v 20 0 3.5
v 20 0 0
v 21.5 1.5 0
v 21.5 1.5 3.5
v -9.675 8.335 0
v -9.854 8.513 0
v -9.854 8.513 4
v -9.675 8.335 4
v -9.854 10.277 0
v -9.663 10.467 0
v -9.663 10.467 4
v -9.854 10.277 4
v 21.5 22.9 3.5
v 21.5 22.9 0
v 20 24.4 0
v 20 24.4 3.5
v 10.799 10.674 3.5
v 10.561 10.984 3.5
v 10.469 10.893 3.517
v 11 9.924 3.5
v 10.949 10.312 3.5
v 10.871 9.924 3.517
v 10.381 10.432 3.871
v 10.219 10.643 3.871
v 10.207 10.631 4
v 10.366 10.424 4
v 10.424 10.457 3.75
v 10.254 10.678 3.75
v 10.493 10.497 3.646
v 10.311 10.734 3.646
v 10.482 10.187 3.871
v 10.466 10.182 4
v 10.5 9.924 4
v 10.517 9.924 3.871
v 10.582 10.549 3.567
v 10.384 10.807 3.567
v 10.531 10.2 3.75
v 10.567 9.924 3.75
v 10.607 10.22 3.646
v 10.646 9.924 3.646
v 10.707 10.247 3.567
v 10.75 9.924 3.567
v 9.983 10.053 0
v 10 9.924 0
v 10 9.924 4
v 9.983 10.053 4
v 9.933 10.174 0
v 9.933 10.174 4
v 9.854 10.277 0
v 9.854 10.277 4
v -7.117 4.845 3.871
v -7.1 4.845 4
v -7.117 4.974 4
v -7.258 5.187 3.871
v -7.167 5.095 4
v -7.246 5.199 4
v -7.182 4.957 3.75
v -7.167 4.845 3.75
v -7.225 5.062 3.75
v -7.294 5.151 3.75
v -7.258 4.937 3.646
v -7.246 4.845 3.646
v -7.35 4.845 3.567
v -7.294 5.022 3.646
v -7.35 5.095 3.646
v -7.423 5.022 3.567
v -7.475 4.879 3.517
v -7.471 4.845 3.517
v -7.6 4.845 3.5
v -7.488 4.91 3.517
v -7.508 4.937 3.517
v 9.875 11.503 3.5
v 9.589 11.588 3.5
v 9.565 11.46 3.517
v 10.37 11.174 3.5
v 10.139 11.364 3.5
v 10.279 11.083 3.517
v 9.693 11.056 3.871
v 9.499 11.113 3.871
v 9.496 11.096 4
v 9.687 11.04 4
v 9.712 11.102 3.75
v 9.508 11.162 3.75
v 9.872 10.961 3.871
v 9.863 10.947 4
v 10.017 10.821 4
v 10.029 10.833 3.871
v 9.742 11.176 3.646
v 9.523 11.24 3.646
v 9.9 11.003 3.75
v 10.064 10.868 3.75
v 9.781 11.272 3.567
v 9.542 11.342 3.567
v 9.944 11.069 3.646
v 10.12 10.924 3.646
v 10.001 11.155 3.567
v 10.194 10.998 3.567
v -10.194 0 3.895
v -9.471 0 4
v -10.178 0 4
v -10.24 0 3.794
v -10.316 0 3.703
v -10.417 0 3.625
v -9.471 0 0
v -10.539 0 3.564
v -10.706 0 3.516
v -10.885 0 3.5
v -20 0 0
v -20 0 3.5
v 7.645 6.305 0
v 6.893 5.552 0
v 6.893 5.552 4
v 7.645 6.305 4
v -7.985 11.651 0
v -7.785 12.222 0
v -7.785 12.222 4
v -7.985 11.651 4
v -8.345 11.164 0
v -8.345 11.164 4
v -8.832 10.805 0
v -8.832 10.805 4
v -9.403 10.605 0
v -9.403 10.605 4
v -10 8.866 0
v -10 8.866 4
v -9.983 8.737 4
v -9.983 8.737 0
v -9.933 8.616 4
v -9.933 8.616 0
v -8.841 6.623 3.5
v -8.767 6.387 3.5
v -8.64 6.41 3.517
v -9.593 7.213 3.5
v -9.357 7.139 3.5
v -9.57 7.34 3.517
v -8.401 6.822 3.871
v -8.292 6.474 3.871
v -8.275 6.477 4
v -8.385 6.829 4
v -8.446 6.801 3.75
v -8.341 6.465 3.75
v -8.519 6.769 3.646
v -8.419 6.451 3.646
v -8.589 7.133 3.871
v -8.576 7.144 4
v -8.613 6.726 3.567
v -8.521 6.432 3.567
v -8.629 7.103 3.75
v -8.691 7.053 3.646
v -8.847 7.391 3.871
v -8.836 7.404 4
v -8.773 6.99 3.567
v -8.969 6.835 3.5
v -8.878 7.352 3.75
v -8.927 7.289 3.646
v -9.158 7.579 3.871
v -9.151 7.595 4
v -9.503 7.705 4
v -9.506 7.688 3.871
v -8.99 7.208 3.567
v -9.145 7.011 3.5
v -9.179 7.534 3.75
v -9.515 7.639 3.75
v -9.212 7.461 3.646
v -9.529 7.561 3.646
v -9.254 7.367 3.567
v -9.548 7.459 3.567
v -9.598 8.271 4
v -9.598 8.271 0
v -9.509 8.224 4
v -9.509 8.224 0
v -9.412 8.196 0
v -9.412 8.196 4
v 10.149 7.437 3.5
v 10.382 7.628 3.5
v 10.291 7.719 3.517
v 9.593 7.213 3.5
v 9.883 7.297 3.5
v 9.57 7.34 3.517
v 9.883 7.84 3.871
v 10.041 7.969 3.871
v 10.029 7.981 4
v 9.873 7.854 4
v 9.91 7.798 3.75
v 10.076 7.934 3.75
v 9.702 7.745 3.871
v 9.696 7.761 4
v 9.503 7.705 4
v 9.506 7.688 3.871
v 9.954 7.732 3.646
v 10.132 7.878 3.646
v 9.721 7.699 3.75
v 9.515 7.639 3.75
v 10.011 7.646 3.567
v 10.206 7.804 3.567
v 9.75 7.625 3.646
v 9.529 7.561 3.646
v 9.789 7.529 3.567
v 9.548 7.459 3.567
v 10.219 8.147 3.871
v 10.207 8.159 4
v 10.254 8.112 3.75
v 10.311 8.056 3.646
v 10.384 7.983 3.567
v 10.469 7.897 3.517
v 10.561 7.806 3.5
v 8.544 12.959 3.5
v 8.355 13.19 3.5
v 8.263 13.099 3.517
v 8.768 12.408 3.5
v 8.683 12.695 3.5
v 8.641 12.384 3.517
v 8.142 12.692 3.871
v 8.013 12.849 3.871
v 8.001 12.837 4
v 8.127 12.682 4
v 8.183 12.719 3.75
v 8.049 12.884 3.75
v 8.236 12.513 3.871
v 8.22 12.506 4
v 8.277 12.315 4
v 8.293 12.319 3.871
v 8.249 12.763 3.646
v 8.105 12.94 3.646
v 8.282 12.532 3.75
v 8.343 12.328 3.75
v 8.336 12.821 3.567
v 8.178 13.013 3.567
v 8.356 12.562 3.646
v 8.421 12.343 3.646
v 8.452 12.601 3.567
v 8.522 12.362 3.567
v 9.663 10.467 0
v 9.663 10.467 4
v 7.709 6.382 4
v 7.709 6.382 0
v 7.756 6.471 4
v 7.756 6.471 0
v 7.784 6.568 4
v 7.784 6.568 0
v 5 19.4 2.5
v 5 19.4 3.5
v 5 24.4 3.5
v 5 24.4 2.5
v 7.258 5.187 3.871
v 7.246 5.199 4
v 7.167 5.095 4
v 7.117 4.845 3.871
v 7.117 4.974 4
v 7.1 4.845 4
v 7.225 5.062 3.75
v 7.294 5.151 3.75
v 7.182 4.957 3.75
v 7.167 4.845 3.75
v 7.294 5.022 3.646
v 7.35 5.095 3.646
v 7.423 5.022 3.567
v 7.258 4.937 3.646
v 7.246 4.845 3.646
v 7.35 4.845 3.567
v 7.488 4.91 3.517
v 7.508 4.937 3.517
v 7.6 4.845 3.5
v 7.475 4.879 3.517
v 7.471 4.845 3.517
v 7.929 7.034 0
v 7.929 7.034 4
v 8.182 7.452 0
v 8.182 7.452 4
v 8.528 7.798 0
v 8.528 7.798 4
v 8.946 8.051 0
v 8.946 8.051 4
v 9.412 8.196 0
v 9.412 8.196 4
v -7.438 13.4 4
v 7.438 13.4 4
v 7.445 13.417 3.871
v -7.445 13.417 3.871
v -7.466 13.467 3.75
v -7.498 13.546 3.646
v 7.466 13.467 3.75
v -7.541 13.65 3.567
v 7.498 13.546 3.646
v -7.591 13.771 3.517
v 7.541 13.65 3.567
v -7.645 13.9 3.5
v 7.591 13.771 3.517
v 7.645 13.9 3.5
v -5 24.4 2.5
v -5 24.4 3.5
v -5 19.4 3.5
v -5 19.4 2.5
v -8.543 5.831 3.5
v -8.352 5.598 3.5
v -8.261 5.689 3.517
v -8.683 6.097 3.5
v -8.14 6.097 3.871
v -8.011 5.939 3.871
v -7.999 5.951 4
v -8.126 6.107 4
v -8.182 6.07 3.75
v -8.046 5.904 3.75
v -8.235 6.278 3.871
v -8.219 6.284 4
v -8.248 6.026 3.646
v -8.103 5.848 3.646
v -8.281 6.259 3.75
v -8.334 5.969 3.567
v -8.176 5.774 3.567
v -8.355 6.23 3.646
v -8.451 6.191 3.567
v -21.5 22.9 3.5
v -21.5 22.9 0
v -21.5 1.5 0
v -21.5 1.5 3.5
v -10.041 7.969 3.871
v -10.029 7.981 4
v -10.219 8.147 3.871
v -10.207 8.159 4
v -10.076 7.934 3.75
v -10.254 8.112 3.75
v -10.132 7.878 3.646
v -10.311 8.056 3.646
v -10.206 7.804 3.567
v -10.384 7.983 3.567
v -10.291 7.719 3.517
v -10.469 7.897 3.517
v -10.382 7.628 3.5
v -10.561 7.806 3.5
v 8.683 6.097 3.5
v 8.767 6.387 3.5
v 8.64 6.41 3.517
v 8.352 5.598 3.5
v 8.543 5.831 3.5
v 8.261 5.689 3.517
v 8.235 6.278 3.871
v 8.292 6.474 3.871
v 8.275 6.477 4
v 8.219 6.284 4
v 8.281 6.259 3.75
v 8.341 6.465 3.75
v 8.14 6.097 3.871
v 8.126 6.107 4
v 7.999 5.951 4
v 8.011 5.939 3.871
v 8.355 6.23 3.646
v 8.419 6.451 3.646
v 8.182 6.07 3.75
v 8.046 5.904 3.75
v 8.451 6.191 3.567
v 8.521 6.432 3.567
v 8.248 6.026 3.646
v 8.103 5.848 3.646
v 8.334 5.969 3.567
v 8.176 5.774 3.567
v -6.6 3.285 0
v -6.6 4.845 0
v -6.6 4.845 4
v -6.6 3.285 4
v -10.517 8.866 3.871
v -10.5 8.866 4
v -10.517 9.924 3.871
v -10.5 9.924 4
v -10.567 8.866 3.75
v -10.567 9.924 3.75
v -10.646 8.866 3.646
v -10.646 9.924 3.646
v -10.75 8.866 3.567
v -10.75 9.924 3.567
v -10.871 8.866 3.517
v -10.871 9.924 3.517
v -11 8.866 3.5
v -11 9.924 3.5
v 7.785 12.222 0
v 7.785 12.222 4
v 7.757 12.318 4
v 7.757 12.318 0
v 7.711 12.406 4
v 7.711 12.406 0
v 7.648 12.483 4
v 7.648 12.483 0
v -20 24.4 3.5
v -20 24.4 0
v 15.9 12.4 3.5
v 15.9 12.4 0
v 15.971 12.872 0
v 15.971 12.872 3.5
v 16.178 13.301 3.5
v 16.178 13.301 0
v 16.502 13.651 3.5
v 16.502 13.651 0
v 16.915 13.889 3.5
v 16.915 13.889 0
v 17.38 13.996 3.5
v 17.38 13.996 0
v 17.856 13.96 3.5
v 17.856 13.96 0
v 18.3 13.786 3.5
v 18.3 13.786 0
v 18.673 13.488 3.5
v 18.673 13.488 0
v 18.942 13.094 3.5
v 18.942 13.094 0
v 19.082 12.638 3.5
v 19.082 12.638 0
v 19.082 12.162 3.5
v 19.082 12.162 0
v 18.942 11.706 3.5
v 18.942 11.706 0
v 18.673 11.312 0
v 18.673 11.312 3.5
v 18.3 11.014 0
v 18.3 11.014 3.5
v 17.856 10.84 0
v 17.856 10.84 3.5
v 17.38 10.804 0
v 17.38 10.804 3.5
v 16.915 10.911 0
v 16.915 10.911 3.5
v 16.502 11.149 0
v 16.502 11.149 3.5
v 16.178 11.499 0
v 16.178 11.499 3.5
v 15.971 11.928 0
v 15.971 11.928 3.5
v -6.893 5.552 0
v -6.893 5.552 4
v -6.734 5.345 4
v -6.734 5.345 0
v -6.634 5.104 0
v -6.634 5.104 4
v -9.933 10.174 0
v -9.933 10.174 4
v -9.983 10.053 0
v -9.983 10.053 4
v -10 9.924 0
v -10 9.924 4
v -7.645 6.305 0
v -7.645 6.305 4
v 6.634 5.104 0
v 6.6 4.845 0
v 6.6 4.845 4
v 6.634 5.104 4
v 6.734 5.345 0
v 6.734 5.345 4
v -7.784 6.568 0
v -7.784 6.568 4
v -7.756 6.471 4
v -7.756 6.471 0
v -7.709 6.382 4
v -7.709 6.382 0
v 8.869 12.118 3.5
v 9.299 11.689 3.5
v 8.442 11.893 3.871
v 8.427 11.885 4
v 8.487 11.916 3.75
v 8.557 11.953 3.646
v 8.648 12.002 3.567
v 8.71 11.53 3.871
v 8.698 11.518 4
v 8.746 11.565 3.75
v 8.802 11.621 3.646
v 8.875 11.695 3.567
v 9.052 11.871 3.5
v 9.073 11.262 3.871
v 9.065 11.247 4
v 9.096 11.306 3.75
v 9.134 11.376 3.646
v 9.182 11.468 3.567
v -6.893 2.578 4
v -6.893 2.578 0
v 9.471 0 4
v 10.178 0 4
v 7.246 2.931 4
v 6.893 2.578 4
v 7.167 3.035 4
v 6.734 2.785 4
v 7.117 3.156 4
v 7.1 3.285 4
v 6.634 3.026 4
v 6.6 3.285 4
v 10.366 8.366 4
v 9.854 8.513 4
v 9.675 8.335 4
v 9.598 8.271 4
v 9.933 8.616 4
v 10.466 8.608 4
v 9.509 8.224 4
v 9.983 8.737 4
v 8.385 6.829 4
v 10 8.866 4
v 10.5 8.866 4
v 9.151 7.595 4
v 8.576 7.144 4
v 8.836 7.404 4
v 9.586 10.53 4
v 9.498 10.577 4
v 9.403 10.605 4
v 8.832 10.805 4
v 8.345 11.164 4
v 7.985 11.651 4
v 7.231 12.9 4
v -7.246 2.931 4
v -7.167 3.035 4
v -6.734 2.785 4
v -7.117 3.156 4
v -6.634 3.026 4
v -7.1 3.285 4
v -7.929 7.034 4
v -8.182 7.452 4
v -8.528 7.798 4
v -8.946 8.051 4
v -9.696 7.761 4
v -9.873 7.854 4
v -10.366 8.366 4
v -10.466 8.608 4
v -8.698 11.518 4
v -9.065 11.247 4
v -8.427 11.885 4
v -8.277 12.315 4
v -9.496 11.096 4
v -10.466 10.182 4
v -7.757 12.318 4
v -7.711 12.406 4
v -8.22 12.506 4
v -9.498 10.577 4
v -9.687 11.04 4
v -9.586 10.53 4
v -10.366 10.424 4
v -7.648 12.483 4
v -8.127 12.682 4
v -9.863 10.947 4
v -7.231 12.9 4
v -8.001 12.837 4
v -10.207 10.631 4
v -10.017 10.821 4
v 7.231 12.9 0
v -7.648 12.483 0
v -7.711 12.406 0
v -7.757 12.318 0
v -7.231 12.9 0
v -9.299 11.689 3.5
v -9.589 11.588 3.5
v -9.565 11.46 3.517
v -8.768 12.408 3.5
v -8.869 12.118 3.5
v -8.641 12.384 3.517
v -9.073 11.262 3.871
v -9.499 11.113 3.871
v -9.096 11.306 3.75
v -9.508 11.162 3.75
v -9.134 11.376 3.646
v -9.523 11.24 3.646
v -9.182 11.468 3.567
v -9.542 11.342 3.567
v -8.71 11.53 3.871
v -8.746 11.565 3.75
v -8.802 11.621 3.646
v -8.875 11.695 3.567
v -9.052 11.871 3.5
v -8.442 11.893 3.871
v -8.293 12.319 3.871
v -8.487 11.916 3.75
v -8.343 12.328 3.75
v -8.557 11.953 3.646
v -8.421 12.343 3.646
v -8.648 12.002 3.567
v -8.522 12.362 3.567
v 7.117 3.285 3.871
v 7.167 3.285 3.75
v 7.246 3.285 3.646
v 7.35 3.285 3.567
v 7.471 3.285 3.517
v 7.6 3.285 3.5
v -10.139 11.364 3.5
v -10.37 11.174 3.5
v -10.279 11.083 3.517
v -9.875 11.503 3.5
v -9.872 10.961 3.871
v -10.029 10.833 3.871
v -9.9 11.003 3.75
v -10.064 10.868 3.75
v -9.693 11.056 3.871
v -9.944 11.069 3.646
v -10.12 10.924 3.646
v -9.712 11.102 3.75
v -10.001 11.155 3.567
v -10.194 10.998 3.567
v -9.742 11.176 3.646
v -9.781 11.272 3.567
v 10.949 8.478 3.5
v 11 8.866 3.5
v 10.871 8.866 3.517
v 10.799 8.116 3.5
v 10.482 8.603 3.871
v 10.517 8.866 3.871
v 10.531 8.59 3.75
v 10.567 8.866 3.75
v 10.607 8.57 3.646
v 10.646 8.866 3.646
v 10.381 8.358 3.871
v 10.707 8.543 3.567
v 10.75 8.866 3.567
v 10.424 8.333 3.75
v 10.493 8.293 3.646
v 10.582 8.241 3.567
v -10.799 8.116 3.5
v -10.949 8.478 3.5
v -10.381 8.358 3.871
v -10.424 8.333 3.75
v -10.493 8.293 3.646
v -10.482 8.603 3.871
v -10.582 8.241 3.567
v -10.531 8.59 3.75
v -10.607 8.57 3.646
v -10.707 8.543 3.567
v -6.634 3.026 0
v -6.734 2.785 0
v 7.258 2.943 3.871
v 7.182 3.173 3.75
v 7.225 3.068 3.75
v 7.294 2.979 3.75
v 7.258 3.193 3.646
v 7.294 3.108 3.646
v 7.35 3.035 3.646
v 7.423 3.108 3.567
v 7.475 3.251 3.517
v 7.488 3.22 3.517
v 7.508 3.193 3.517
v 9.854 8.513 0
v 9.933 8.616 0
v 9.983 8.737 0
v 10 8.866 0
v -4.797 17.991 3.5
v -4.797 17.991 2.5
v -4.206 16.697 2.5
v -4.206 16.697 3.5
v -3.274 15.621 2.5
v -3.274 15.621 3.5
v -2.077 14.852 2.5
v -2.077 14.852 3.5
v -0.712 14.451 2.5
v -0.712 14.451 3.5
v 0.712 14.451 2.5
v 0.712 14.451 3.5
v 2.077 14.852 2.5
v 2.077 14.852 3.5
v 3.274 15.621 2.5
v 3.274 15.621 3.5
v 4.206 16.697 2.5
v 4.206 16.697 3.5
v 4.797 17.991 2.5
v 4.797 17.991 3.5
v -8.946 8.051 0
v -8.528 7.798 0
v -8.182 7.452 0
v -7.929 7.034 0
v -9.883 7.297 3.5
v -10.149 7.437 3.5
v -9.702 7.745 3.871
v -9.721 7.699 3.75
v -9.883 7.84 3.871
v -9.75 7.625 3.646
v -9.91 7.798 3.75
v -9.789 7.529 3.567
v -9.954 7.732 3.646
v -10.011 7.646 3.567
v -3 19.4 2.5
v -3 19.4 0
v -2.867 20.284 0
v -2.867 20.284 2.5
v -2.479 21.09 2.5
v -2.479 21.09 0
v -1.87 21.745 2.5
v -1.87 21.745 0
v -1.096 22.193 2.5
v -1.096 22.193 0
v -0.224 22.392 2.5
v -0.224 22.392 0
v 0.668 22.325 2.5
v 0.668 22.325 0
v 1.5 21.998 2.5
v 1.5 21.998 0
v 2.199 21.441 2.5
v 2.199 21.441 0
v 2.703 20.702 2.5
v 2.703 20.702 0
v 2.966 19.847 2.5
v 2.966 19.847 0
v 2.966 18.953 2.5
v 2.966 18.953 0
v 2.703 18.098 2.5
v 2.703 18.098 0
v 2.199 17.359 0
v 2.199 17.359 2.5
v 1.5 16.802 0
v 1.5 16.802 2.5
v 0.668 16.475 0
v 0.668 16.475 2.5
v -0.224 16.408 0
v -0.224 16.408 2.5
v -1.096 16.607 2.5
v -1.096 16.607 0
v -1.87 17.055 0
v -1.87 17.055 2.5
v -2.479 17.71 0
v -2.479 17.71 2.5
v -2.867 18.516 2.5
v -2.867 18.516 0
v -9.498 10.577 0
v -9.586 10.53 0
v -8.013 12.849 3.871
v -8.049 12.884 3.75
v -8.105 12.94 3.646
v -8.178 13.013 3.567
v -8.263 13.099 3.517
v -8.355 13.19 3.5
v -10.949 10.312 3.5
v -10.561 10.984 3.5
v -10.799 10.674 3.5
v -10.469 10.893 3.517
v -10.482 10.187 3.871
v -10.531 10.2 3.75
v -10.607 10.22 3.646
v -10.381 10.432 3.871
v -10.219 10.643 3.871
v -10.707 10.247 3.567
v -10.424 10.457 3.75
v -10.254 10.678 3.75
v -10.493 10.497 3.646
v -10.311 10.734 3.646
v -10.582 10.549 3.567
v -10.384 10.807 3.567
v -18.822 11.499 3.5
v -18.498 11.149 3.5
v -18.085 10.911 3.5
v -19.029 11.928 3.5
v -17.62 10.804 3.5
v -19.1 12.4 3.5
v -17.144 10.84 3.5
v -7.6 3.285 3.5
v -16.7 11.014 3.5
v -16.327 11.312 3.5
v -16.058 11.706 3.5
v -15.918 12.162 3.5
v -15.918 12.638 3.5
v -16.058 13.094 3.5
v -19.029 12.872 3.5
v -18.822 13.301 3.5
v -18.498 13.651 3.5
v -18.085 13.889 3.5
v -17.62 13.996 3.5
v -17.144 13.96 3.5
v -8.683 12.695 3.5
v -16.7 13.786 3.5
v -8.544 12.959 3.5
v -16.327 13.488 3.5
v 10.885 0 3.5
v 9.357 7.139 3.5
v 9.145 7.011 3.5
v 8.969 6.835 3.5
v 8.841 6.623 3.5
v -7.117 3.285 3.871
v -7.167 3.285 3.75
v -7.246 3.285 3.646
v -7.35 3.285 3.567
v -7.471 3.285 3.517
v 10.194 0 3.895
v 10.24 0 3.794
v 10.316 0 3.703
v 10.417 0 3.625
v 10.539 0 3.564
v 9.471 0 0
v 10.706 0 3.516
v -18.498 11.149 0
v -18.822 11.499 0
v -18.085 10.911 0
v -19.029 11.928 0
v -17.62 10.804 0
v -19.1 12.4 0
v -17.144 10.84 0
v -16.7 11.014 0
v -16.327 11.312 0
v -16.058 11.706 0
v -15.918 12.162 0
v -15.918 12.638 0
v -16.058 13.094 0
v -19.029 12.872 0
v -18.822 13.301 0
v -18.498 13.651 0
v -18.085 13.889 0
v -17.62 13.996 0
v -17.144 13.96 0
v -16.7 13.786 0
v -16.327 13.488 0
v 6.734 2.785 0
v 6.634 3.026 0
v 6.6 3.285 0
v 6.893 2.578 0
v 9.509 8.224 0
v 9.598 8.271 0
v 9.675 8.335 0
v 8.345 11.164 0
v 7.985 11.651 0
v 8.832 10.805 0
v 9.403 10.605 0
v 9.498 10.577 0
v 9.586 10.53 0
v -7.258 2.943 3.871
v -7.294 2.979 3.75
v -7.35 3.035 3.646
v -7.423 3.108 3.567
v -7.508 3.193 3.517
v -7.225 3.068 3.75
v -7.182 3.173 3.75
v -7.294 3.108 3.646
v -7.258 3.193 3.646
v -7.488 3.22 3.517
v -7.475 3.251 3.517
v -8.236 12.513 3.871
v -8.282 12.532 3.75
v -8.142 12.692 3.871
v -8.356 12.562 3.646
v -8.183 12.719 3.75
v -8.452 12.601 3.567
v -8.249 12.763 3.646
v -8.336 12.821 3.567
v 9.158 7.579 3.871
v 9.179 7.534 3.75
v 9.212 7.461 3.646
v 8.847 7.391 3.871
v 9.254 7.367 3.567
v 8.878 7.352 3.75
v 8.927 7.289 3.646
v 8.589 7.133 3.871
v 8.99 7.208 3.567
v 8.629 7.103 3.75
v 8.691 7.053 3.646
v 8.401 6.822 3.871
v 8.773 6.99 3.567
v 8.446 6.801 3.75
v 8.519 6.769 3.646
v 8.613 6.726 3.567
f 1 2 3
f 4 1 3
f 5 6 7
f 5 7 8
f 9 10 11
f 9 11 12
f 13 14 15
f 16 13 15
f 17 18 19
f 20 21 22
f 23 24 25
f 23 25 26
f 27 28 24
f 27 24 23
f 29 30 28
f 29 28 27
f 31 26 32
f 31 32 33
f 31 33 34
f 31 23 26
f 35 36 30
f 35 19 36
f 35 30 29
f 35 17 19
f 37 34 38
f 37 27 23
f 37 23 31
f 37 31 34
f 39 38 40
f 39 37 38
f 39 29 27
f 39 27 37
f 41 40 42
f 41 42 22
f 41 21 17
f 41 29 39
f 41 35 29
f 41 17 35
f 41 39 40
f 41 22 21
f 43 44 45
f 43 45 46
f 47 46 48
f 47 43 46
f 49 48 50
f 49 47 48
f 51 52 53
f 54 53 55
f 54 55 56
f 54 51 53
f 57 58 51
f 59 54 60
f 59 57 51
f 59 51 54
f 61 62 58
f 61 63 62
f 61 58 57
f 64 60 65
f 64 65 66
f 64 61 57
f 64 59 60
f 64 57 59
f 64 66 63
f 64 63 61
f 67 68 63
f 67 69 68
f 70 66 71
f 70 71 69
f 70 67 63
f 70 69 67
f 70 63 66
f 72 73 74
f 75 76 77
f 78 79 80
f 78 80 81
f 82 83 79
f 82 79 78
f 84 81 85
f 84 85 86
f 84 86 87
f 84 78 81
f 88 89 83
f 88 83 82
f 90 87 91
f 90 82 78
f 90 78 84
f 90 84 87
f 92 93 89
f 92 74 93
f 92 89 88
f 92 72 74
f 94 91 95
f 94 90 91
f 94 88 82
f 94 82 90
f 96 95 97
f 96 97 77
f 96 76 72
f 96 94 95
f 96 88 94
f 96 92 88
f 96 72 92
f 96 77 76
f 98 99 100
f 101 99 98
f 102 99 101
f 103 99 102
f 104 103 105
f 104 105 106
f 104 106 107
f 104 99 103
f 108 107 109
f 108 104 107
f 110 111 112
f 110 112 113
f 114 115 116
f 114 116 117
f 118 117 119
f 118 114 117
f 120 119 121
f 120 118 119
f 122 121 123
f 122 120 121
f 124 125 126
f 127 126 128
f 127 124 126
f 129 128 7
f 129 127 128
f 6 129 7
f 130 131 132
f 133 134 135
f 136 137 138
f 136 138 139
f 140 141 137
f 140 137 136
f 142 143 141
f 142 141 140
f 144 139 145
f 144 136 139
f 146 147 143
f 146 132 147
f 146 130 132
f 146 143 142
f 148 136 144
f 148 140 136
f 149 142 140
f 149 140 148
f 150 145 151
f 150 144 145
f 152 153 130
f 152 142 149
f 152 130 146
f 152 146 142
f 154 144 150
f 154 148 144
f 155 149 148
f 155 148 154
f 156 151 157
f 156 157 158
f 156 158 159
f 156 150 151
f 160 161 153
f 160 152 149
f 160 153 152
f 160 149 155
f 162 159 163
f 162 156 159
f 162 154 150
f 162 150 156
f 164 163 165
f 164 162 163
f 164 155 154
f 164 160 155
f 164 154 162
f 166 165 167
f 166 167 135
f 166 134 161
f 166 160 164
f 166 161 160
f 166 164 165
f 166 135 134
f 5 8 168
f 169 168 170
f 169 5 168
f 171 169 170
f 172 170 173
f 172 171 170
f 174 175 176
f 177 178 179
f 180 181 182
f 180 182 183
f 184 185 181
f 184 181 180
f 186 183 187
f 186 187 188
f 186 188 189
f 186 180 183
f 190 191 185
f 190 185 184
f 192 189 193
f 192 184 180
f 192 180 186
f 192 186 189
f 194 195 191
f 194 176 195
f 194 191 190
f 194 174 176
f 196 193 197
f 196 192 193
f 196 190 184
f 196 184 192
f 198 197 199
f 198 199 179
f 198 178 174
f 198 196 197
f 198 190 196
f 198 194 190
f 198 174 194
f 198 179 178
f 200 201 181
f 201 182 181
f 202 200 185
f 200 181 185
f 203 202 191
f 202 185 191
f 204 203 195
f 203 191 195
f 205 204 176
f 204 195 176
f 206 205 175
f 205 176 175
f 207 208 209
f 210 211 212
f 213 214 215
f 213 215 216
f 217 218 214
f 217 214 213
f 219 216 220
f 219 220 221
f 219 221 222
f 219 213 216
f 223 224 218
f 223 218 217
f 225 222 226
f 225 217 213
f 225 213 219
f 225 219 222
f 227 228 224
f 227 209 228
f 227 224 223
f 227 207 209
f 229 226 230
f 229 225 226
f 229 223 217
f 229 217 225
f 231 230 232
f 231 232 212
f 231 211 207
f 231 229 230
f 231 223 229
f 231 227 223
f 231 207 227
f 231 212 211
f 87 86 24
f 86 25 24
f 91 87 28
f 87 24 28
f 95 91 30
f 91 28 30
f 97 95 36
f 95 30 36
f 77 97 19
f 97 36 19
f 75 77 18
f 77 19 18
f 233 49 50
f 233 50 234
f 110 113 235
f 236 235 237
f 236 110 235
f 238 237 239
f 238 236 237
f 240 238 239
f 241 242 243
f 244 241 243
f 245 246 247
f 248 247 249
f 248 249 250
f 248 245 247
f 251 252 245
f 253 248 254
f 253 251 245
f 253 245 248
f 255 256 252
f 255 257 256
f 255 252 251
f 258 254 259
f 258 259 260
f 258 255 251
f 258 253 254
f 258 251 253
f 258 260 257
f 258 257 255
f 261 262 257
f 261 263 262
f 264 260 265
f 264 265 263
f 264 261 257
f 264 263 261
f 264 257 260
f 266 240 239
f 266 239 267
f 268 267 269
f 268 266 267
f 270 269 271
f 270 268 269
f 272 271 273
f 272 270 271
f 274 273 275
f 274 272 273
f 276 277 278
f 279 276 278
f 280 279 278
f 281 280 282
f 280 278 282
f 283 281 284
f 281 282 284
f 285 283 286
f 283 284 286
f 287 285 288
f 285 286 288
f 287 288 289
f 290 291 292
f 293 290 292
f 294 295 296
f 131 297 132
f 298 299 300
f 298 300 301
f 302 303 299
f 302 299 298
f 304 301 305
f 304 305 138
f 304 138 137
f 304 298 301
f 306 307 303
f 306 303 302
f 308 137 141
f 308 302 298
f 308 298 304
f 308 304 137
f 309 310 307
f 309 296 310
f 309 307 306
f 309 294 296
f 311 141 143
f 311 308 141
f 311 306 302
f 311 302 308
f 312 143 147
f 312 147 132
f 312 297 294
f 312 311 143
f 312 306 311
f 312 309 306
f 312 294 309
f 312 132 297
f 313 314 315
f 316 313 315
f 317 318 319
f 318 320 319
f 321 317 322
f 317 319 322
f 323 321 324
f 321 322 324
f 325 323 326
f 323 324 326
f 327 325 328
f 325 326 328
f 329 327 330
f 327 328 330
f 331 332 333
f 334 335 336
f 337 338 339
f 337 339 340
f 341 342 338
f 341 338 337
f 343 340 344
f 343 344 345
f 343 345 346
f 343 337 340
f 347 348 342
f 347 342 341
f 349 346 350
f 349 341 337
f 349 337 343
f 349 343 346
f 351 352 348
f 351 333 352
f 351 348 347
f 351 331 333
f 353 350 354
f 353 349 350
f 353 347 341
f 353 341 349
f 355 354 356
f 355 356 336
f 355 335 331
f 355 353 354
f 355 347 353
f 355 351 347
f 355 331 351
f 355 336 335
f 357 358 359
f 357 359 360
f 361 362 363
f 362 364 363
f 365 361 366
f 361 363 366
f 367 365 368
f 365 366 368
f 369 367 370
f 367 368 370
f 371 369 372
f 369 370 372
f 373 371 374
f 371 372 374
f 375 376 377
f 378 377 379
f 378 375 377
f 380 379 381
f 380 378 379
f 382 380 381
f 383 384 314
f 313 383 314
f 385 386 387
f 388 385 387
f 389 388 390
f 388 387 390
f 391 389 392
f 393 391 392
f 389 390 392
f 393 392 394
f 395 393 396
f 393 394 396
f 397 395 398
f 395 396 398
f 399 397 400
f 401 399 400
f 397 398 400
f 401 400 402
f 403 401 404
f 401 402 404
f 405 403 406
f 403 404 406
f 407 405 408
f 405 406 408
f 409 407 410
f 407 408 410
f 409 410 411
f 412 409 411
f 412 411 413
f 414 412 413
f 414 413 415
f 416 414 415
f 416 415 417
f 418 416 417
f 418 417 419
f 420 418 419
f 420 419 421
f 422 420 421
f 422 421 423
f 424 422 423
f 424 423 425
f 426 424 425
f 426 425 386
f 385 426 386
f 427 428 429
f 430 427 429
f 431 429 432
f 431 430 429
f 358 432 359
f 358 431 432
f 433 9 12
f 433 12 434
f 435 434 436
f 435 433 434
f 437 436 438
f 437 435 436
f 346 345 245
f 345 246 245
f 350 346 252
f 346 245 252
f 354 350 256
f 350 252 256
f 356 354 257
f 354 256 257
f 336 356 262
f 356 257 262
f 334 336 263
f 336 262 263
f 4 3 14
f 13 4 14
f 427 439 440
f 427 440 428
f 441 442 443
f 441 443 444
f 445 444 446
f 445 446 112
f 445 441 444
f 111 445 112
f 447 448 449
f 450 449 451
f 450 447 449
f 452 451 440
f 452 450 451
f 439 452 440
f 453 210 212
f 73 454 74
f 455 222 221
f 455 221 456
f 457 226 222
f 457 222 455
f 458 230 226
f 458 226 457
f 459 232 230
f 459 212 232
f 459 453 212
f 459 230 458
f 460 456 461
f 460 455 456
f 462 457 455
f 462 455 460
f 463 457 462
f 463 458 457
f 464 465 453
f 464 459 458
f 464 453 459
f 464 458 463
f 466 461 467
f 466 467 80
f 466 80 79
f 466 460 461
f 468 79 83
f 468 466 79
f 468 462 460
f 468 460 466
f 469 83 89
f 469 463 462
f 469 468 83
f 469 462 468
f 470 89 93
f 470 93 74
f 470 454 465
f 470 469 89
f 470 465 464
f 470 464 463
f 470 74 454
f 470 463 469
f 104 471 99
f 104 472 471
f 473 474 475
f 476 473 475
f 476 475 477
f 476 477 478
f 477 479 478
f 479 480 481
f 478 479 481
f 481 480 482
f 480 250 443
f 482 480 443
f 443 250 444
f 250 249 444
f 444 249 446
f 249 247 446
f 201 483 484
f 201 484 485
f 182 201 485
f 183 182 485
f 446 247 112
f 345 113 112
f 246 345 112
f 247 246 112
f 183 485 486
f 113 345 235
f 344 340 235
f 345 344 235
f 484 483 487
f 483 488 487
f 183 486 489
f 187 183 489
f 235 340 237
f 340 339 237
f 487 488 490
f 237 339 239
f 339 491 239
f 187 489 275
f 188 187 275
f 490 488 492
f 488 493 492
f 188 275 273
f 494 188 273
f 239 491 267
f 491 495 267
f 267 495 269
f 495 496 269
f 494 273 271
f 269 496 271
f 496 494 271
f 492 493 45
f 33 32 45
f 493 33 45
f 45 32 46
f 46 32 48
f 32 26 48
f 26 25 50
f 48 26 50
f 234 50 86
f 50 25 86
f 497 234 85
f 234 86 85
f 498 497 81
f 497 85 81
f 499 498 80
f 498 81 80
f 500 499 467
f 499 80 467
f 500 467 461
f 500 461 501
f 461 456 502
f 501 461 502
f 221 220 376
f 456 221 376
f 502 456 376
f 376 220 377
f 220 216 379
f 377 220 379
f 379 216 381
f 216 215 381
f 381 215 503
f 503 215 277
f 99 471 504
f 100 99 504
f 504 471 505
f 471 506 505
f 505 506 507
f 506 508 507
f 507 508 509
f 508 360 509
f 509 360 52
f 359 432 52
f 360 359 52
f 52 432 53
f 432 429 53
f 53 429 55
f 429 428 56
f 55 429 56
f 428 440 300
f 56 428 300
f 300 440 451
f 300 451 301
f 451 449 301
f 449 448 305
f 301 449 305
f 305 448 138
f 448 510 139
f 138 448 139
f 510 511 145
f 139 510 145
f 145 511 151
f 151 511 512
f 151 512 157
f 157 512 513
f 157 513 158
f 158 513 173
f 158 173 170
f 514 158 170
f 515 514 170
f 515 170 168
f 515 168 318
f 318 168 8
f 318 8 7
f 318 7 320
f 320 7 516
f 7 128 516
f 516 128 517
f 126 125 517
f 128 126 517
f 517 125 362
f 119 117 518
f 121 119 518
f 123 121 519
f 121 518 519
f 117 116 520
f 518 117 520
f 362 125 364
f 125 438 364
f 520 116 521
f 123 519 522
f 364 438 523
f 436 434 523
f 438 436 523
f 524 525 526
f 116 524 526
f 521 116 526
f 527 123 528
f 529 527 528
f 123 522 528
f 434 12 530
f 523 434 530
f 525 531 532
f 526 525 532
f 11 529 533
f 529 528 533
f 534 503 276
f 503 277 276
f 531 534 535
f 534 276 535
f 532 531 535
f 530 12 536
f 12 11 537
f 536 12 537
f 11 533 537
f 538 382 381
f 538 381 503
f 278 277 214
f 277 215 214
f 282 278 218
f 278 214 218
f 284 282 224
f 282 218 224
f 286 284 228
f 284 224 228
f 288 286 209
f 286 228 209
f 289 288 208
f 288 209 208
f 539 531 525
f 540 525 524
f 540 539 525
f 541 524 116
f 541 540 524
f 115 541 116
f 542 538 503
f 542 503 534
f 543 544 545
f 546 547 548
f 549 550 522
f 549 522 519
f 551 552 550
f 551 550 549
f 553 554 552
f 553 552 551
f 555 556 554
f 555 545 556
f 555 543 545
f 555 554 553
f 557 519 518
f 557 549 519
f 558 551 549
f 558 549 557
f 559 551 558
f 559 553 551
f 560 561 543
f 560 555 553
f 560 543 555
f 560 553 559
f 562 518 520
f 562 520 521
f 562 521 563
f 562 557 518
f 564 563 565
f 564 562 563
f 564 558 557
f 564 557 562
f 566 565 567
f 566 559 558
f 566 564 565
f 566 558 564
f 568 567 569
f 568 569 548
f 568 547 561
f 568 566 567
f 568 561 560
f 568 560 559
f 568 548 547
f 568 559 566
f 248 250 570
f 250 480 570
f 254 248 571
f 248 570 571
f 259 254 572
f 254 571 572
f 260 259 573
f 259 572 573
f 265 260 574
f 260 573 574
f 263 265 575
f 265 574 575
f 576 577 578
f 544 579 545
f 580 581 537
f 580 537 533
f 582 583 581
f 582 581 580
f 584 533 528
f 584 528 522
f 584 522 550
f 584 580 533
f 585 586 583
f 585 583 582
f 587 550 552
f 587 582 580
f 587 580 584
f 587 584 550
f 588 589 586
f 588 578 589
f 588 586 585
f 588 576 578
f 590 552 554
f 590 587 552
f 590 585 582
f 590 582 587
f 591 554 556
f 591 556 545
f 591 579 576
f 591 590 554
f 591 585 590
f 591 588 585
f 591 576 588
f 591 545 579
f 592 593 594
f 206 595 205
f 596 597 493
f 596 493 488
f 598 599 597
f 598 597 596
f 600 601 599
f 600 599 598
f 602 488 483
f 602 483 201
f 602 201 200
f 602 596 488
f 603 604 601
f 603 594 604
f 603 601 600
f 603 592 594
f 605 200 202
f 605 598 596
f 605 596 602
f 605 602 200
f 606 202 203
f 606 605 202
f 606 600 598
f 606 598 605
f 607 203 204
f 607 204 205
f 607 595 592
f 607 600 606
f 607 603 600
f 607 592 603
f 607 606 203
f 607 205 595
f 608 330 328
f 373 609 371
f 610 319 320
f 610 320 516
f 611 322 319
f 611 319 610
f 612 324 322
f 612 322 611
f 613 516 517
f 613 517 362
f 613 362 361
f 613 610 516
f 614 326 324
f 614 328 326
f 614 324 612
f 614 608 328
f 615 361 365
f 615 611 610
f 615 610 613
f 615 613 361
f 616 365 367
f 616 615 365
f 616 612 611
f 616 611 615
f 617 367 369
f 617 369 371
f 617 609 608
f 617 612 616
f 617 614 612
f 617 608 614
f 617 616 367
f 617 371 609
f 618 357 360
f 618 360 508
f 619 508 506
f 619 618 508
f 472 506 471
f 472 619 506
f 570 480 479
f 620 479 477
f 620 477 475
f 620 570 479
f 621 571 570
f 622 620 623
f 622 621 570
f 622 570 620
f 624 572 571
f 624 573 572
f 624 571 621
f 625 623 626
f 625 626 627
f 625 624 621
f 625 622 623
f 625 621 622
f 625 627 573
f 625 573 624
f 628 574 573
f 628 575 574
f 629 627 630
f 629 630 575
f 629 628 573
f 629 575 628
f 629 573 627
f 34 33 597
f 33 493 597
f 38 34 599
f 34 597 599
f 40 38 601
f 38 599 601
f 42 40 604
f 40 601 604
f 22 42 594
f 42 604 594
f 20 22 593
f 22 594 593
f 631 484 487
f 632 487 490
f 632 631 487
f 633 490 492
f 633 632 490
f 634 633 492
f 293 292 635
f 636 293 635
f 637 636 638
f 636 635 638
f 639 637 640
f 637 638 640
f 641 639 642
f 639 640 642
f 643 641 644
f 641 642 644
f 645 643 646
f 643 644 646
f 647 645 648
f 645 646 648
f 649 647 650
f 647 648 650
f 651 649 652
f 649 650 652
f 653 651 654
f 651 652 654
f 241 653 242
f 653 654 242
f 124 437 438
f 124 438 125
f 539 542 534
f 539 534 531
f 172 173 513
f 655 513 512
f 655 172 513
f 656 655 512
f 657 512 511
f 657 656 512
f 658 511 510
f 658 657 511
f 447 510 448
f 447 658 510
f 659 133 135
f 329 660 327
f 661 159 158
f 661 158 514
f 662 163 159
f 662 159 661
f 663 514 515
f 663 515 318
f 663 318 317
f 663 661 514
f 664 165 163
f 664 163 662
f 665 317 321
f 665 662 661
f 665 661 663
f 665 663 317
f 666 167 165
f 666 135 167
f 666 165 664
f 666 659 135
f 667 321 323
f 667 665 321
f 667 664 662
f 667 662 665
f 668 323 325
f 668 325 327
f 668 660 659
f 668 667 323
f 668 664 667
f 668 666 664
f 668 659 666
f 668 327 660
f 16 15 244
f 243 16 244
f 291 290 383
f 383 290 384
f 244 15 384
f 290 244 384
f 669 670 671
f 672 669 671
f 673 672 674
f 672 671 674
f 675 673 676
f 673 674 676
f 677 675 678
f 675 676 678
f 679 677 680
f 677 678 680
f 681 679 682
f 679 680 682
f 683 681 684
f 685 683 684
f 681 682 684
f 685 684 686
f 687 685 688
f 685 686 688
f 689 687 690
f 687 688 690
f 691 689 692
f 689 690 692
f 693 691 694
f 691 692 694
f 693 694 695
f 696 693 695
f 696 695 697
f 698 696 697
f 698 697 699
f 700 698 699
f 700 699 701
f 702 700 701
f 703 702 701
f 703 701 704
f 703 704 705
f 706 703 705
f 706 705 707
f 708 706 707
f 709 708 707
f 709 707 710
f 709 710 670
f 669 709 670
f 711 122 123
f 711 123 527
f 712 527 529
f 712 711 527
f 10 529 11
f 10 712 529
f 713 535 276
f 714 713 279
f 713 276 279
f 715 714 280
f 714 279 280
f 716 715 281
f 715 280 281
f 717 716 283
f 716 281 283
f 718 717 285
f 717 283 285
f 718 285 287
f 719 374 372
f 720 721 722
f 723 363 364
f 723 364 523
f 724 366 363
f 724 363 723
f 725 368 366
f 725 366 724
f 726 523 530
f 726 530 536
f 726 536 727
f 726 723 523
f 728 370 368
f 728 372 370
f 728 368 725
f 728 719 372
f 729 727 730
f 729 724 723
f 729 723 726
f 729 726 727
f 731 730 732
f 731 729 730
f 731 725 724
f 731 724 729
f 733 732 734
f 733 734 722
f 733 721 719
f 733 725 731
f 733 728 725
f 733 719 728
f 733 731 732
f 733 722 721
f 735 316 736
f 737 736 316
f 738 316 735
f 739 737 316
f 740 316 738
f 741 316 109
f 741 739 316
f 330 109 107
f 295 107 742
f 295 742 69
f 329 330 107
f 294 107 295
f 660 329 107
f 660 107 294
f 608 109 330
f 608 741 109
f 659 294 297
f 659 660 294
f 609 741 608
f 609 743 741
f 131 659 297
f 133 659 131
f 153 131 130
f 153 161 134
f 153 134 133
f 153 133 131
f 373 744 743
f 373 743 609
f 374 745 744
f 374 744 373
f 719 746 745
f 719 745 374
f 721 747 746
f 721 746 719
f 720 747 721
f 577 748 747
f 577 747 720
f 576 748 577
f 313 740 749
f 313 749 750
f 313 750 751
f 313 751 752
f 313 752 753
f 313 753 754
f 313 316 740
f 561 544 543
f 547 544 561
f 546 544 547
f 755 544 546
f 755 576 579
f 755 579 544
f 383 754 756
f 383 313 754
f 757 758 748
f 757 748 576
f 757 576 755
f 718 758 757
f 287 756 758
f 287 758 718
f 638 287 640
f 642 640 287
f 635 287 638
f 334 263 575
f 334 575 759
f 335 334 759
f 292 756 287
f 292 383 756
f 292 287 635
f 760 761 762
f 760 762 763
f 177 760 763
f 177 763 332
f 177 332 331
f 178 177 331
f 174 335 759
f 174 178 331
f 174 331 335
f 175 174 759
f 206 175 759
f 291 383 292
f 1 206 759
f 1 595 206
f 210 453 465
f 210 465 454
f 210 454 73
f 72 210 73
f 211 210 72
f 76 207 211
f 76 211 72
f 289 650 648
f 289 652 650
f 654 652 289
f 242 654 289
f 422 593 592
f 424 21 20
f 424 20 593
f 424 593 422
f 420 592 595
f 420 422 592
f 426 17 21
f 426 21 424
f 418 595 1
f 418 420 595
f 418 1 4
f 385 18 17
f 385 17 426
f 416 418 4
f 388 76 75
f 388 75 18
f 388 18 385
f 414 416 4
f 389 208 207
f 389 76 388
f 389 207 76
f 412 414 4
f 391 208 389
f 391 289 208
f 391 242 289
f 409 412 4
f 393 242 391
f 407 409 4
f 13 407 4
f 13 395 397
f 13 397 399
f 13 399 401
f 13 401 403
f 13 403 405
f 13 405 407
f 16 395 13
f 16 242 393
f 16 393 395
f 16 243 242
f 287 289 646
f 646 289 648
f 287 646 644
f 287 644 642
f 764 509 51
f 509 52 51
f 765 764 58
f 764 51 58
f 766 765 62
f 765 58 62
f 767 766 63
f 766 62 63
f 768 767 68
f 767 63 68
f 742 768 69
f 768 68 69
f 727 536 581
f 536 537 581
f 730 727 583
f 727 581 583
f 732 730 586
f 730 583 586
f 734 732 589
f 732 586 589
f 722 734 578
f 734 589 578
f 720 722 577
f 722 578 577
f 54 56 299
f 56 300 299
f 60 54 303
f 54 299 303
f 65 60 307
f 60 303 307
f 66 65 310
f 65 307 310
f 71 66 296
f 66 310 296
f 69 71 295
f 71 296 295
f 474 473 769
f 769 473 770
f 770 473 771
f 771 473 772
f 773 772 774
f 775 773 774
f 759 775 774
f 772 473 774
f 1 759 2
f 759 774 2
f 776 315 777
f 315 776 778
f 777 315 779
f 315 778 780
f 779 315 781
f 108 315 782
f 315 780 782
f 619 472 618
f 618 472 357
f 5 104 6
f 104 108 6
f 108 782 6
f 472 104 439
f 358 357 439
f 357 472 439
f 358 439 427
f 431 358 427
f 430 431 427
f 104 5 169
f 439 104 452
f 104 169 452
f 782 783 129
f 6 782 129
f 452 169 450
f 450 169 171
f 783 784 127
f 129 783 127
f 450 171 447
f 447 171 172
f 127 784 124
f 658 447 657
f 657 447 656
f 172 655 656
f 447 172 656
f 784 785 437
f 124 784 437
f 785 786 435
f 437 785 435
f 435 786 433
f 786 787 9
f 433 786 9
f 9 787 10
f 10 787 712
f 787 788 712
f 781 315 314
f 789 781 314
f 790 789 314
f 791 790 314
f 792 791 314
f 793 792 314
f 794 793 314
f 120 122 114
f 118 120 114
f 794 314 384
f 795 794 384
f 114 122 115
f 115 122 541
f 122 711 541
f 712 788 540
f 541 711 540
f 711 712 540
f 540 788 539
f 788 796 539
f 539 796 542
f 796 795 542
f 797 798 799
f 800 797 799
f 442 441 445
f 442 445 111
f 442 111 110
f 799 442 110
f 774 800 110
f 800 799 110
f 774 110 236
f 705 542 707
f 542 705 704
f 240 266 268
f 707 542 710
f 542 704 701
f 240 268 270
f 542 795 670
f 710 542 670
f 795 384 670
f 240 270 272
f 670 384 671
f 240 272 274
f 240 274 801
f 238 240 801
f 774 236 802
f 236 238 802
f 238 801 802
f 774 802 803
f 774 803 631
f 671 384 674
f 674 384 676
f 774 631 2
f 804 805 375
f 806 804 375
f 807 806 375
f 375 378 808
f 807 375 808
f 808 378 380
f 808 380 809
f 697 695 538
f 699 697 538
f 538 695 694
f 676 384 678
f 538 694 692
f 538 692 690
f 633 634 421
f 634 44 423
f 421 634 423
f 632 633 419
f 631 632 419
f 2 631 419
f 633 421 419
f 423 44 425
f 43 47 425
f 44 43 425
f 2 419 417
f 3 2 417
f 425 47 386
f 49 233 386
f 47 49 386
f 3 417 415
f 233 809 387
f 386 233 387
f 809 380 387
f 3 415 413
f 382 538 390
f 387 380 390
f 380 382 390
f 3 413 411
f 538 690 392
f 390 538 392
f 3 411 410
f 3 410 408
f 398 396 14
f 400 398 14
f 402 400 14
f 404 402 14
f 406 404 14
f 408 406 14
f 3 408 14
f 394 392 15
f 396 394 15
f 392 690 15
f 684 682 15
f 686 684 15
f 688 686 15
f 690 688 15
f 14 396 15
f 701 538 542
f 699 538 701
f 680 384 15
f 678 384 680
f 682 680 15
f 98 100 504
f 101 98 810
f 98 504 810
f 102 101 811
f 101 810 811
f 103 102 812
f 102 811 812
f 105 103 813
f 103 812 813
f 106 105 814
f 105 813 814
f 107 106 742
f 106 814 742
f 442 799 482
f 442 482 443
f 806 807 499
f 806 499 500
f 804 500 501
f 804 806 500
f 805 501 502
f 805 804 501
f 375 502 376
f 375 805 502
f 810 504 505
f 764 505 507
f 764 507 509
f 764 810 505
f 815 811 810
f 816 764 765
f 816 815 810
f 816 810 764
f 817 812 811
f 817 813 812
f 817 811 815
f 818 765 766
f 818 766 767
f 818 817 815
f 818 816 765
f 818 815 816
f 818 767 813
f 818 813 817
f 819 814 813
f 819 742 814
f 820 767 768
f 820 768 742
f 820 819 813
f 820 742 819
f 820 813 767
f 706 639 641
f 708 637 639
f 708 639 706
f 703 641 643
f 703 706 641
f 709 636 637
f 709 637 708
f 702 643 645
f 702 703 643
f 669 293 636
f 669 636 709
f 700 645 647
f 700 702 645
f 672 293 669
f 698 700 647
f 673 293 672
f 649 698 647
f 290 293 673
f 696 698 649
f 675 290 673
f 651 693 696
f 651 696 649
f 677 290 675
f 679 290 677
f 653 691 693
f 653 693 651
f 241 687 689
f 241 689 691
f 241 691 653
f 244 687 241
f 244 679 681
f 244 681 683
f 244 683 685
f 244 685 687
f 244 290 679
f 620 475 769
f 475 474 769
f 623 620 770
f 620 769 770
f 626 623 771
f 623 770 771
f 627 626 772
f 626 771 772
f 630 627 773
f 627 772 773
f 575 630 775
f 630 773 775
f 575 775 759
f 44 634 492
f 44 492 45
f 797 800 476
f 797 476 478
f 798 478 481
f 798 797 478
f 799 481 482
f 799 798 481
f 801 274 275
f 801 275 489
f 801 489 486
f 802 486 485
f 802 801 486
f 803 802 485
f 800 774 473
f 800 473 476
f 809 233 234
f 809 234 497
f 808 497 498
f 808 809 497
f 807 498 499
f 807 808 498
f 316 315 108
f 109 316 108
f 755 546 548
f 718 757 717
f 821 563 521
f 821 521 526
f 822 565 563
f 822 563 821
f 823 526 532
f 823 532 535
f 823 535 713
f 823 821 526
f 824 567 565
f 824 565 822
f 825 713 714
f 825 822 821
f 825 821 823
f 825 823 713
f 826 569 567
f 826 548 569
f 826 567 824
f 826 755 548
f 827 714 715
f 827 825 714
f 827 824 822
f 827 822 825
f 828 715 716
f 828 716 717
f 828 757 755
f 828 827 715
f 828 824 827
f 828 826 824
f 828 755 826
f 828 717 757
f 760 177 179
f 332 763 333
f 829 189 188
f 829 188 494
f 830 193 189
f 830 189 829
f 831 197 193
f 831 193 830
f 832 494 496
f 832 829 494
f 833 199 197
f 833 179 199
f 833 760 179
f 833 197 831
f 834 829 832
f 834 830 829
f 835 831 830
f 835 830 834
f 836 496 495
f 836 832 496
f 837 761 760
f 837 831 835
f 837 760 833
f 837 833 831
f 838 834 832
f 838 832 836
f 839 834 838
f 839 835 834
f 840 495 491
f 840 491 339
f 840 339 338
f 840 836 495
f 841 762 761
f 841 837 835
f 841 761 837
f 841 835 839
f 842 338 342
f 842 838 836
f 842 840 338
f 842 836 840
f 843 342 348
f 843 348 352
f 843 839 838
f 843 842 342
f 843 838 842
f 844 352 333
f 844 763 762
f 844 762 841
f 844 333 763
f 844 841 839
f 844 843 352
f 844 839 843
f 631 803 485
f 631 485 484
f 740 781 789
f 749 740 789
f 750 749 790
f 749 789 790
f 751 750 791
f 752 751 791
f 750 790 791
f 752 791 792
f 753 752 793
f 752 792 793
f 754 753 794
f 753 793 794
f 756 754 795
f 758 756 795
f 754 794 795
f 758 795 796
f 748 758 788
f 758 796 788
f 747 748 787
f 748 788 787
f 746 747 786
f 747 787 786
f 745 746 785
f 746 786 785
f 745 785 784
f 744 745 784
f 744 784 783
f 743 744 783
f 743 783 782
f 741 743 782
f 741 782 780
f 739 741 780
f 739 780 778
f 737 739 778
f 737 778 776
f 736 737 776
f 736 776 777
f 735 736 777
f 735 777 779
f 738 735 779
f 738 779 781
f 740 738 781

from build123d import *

# Parameters (mm, degrees)
ENDSEAL_1_DEPTH              = 3.5
BOSS_EXTRUDE1_DEPTH          = 0.5
FILLET1_R                    = 0.5
F_6_0_6_DIAMETER_HOLE1_D     = 6
F_6_0_6_DIAMETER_HOLE1_DEPTH = 12.5
F_6_0_6_DIAMETER_HOLE1_TIP   = 1.561701152
CUT_EXTRUDE2_DEPTH           = 1
F_3_2_3_2_DIAMETER_HOLE1_D   = 3.2


with BuildPart() as part:
    # Sketch4 → Endseal 1 (new body)
    with BuildSketch(Plane.XY):
        with BuildLine():
            Line((-7.230720611, 12.9), (7.230720611, 12.9))
            Line((7.230720611, 12.9), (7.647672674, 12.483047938))
            ThreePointArc((7.647672674, 12.483047938), (7.736182466, 12.363118479), (7.785406885, 12.222427275))
            ThreePointArc((7.785406885, 12.222427275), (8.344607784, 11.164307384), (9.402727675, 10.605106485))
            ThreePointArc((9.402727675, 10.605106485), (9.54341888, 10.555882066), (9.663348338, 10.467372274))
            Line((9.663348338, 10.467372274), (9.853553391, 10.277167221))
            ThreePointArc((9.853553391, 10.277167221), (9.961939766, 10.114955546), (10, 9.92361383))
            Line((10, 9.92361383), (10, 8.86638617))
            ThreePointArc((10, 8.86638617), (9.961939766, 8.675044454), (9.853553391, 8.512832779))
            Line((9.853553391, 8.512832779), (9.675343394, 8.334622782))
            ThreePointArc((9.675343394, 8.334622782), (9.554347216, 8.245550888), (9.412352167, 8.19644607))
            ThreePointArc((9.412352167, 8.19644607), (8.344607784, 7.635448616), (7.783610331, 6.567704234))
            ThreePointArc((7.783610331, 6.567704234), (7.734505512, 6.425709184), (7.645433618, 6.304713007))
            Line((7.645433618, 6.304713007), (6.892893219, 5.552172608))
            ThreePointArc((6.892893219, 5.552172608), (6.676120468, 5.227749259), (6.6, 4.845065826))
            Line((6.6, 4.845065826), (6.6, 3.284934173))
            ThreePointArc((6.6, 3.284934173), (6.676120468, 2.902250741), (6.892893219, 2.577827392))
            Line((6.892893219, 2.577827392), (9.470720611, 0))
            Line((9.470720611, 0), (19.9998779, 0))
            Line((19.9998779, 0), (21.5, 1.5))
            Line((21.5, 1.5), (21.5, 22.9))
            Line((21.5, 22.9), (20.0001221, 24.4))
            Line((20.0001221, 24.4), (-19.9998779, 24.4))
            Line((-19.9998779, 24.4), (-21.5, 22.8997558))
            Line((-21.5, 22.8997558), (-21.5, 1.5))
            Line((-21.5, 1.5), (-19.9998779, 0))
            Line((-19.9998779, 0), (-9.470720611, 0))
            Line((-9.470720611, 0), (-6.892893219, 2.577827392))
            ThreePointArc((-6.892893219, 2.577827392), (-6.676120468, 2.902250741), (-6.6, 3.284934173))
            Line((-6.6, 3.284934173), (-6.6, 4.845065826))
            ThreePointArc((-6.6, 4.845065826), (-6.676120468, 5.227749259), (-6.892893219, 5.552172608))
            Line((-6.892893219, 5.552172608), (-7.645433618, 6.304713006))
            ThreePointArc((-7.645433618, 6.304713006), (-7.734505512, 6.425709184), (-7.783610331, 6.567704233))
            ThreePointArc((-7.783610331, 6.567704233), (-8.344607784, 7.635448616), (-9.412352167, 8.19644607))
            ThreePointArc((-9.412352167, 8.19644607), (-9.554347216, 8.245550888), (-9.675343394, 8.334622782))
            Line((-9.675343394, 8.334622782), (-9.853553391, 8.512832779))
            ThreePointArc((-9.853553391, 8.512832779), (-9.961939766, 8.675044454), (-10, 8.86638617))
            Line((-10, 8.86638617), (-10, 9.92361383))
            ThreePointArc((-10, 9.92361383), (-9.961939766, 10.114955546), (-9.853553391, 10.277167221))
            Line((-9.853553391, 10.277167221), (-9.663348338, 10.467372274))
            ThreePointArc((-9.663348338, 10.467372274), (-9.543418879, 10.555882066), (-9.402727675, 10.605106485))
            ThreePointArc((-9.402727675, 10.605106485), (-8.344607784, 11.164307384), (-7.785406885, 12.222427275))
            ThreePointArc((-7.785406885, 12.222427275), (-7.736182466, 12.363118479), (-7.647672674, 12.483047938))
            Line((-7.647672674, 12.483047938), (-7.230720611, 12.9))
        make_face()
    extrude(amount=ENDSEAL_1_DEPTH)

    # Sketch6 → Boss-Extrude1 (add)
    with BuildSketch(Plane.XY.offset(3.5)):
        with BuildLine():
            Line((-10.177827392, 0), (-7.24644661, 2.931380783))
            ThreePointArc((-7.24644661, 2.931380783), (-7.138060234, 3.093592457), (-7.1, 3.284934173))
            Line((-7.1, 3.284934173), (-7.1, 4.845065826))
            ThreePointArc((-7.1, 4.845065826), (-7.138060234, 5.036407542), (-7.24644661, 5.198619217))
            Line((-7.24644661, 5.198619217), (-7.998987008, 5.951159616))
            ThreePointArc((-7.998987008, 5.951159616), (-8.177130797, 6.193151971), (-8.275340434, 6.47714207))
            ThreePointArc((-8.275340434, 6.47714207), (-8.698161175, 7.281895225), (-9.50291433, 7.704715966))
            ThreePointArc((-9.50291433, 7.704715966), (-9.786904429, 7.802925603), (-10.028896784, 7.981069392))
            Line((-10.028896784, 7.981069392), (-10.207106781, 8.159279389))
            ThreePointArc((-10.207106781, 8.159279389), (-10.423879533, 8.483702737), (-10.5, 8.86638617))
            Line((-10.5, 8.86638617), (-10.5, 9.92361383))
            ThreePointArc((-10.5, 9.92361383), (-10.423879533, 10.306297262), (-10.207106781, 10.630720611))
            Line((-10.207106781, 10.630720611), (-10.016901728, 10.820925664))
            ThreePointArc((-10.016901728, 10.820925664), (-9.777042812, 10.99794525), (-9.495660403, 11.096394087))
            ThreePointArc((-9.495660403, 11.096394087), (-8.698161175, 11.517860775), (-8.276694487, 12.315360003))
            ThreePointArc((-8.276694487, 12.315360003), (-8.17824565, 12.596742412), (-8.001226064, 12.836601328))
            Line((-8.001226064, 12.836601328), (-7.437827392, 13.4))
            Line((-7.437827392, 13.4), (7.437827392, 13.4))
            Line((7.437827392, 13.4), (8.001226064, 12.836601328))
            ThreePointArc((8.001226064, 12.836601328), (8.17824565, 12.596742412), (8.276694487, 12.315360003))
            ThreePointArc((8.276694487, 12.315360003), (8.698161175, 11.517860775), (9.495660403, 11.096394087))
            ThreePointArc((9.495660403, 11.096394087), (9.777042812, 10.99794525), (10.016901728, 10.820925664))
            Line((10.016901728, 10.820925664), (10.207106781, 10.630720611))
            ThreePointArc((10.207106781, 10.630720611), (10.423879533, 10.306297262), (10.5, 9.92361383))
            Line((10.5, 9.92361383), (10.5, 8.86638617))
            ThreePointArc((10.5, 8.86638617), (10.423879533, 8.483702738), (10.207106781, 8.159279389))
            Line((10.207106781, 8.159279389), (10.028896784, 7.981069392))
            ThreePointArc((10.028896784, 7.981069392), (9.786904429, 7.802925604), (9.50291433, 7.704715966))
            ThreePointArc((9.50291433, 7.704715966), (8.698161175, 7.281895225), (8.275340434, 6.47714207))
            ThreePointArc((8.275340434, 6.47714207), (8.177130797, 6.193151971), (7.998987008, 5.951159616))
            Line((7.998987008, 5.951159616), (7.24644661, 5.198619217))
            ThreePointArc((7.24644661, 5.198619217), (7.138060234, 5.036407543), (7.1, 4.845065826))
            Line((7.1, 4.845065826), (7.1, 3.284934173))
            ThreePointArc((7.1, 3.284934173), (7.138060234, 3.093592457), (7.24644661, 2.931380783))
            Line((7.24644661, 2.931380783), (10.177827392, 0))
            Line((10.177827392, 0), (9.470720611, 0))
            Line((9.470720611, 0), (6.892893219, 2.577827392))
            ThreePointArc((6.892893219, 2.577827392), (6.676120468, 2.902250741), (6.6, 3.284934173))
            Line((6.6, 3.284934173), (6.6, 4.845065826))
            ThreePointArc((6.6, 4.845065826), (6.676120468, 5.227749259), (6.892893219, 5.552172608))
            Line((6.892893219, 5.552172608), (7.645433618, 6.304713007))
            ThreePointArc((7.645433618, 6.304713007), (7.734505512, 6.425709184), (7.783610331, 6.567704234))
            ThreePointArc((7.783610331, 6.567704234), (8.344607784, 7.635448616), (9.412352167, 8.19644607))
            ThreePointArc((9.412352167, 8.19644607), (9.554347216, 8.245550888), (9.675343394, 8.334622782))
            Line((9.675343394, 8.334622782), (9.853553391, 8.512832779))
            ThreePointArc((9.853553391, 8.512832779), (9.961939766, 8.675044454), (10, 8.86638617))
            Line((10, 8.86638617), (10, 9.92361383))
            ThreePointArc((10, 9.92361383), (9.961939766, 10.114955546), (9.853553391, 10.277167221))
            Line((9.853553391, 10.277167221), (9.663348338, 10.467372274))
            ThreePointArc((9.663348338, 10.467372274), (9.54341888, 10.555882066), (9.402727675, 10.605106485))
            ThreePointArc((9.402727675, 10.605106485), (8.344607784, 11.164307384), (7.785406885, 12.222427275))
            ThreePointArc((7.785406885, 12.222427275), (7.736182466, 12.363118479), (7.647672674, 12.483047938))
            Line((7.647672674, 12.483047938), (7.230720611, 12.9))
            Line((7.230720611, 12.9), (-7.230720611, 12.9))
            Line((-7.230720611, 12.9), (-7.647672674, 12.483047938))
            ThreePointArc((-7.647672674, 12.483047938), (-7.736182466, 12.363118479), (-7.785406885, 12.222427275))
            ThreePointArc((-7.785406885, 12.222427275), (-8.344607784, 11.164307384), (-9.402727675, 10.605106485))
            ThreePointArc((-9.402727675, 10.605106485), (-9.543418879, 10.555882066), (-9.663348338, 10.467372274))
            Line((-9.663348338, 10.467372274), (-9.853553391, 10.277167221))
            ThreePointArc((-9.853553391, 10.277167221), (-9.961939766, 10.114955546), (-10, 9.92361383))
            Line((-10, 9.92361383), (-10, 8.86638617))
            ThreePointArc((-10, 8.86638617), (-9.961939766, 8.675044454), (-9.853553391, 8.512832779))
            Line((-9.853553391, 8.512832779), (-9.675343394, 8.334622782))
            ThreePointArc((-9.675343394, 8.334622782), (-9.554347216, 8.245550888), (-9.412352167, 8.19644607))
            ThreePointArc((-9.412352167, 8.19644607), (-8.344607784, 7.635448616), (-7.783610331, 6.567704233))
            ThreePointArc((-7.783610331, 6.567704233), (-7.734505512, 6.425709184), (-7.645433618, 6.304713006))
            Line((-7.645433618, 6.304713006), (-6.892893219, 5.552172608))
            ThreePointArc((-6.892893219, 5.552172608), (-6.676120468, 5.227749259), (-6.6, 4.845065826))
            Line((-6.6, 4.845065826), (-6.6, 3.284934173))
            ThreePointArc((-6.6, 3.284934173), (-6.676120468, 2.902250741), (-6.892893219, 2.577827392))
            Line((-6.892893219, 2.577827392), (-9.470720611, 0))
            Line((-9.470720611, 0), (-10.177827392, 0))
        make_face()
    extrude(amount=BOSS_EXTRUDE1_DEPTH)

    # Fillet1
    fillet1_edges = [part.edges().sort_by_distance(p)[0] for p in [
        (-7.719526728, 13.118300664, 3.5),
        (-8.17824565, 12.596742412, 3.5),
        (-8.698161175, 11.517860775, 3.5),
        (-9.777042812, 10.99794525, 3.5),
        (-10.112004255, 10.725823138, 3.5),
        (-10.423879533, 10.306297262, 3.5),
        (-10.5, 9.395, 3.5),
        (-10.423879533, 8.483702737, 3.5),
        (-10.118001783, 8.07017439, 3.5),
        (-9.786904429, 7.802925603, 3.5),
        (-8.698161175, 7.281895225, 3.5),
        (-8.177130797, 6.193151971, 3.5),
        (-7.622716809, 5.574889416, 3.5),
        (-7.138060234, 5.036407542, 3.5),
        (-7.1, 4.065, 3.5),
        (-7.138060234, 3.093592457, 3.5),
        (7.719526728, 13.118300664, 3.5),
        (8.17824565, 12.596742412, 3.5),
        (8.698161175, 11.517860775, 3.5),
        (9.777042812, 10.99794525, 3.5),
        (10.112004255, 10.725823138, 3.5),
        (10.423879533, 10.306297262, 3.5),
        (10.5, 9.395, 3.5),
        (10.423879533, 8.483702738, 3.5),
        (10.118001783, 8.07017439, 3.5),
        (9.786904429, 7.802925604, 3.5),
        (8.698161175, 7.281895225, 3.5),
        (8.177130797, 6.193151971, 3.5),
        (7.622716809, 5.574889417, 3.5),
        (7.138060234, 5.036407543, 3.5),
        (7.1, 4.065, 3.5),
        (7.138060234, 3.093592457, 3.5),
        (-8.712137001, 1.465690391, 3.5),
        (0, 13.4, 3.5),
        (8.712137001, 1.465690391, 3.5),
    ]]
    fillet(fillet1_edges, radius=FILLET1_R - 0.0001)  # a hair under: the kernel refuses the full size

    # Ø6.0 (6) Diameter Hole1
    with Locations(Plane.XY.offset(3.5)):
        with Locations((0, 19.4)):
            Hole(F_6_0_6_DIAMETER_HOLE1_D / 2, depth=F_6_0_6_DIAMETER_HOLE1_DEPTH)
            with Locations((0, 0, -(F_6_0_6_DIAMETER_HOLE1_DEPTH + F_6_0_6_DIAMETER_HOLE1_TIP / 2))):  # 125° drill point
                Cone(0, F_6_0_6_DIAMETER_HOLE1_D / 2, F_6_0_6_DIAMETER_HOLE1_TIP, mode=Mode.SUBTRACT)

    # Sketch9 → Cut-Extrude2 (cut)
    with BuildSketch(Plane.XY.offset(3.5)):
        with BuildLine():
            Line((5, 19.4), (5, 35))
            Line((5, 35), (-5, 35))
            Line((-5, 35), (-5, 19.4))
            ThreePointArc((-5, 19.4), (0, 14.4), (5, 19.4))
        make_face()
    extrude(amount=-CUT_EXTRUDE2_DEPTH, mode=Mode.SUBTRACT)

    # Ø3.2 (3.2) Diameter Hole1 (through all)
    with Locations(Plane.XY.offset(3.5)):
        with Locations((-17.5, 12.4), (17.5, 12.4)):
            Hole(F_3_2_3_2_DIAMETER_HOLE1_D / 2)


solid = part.part
